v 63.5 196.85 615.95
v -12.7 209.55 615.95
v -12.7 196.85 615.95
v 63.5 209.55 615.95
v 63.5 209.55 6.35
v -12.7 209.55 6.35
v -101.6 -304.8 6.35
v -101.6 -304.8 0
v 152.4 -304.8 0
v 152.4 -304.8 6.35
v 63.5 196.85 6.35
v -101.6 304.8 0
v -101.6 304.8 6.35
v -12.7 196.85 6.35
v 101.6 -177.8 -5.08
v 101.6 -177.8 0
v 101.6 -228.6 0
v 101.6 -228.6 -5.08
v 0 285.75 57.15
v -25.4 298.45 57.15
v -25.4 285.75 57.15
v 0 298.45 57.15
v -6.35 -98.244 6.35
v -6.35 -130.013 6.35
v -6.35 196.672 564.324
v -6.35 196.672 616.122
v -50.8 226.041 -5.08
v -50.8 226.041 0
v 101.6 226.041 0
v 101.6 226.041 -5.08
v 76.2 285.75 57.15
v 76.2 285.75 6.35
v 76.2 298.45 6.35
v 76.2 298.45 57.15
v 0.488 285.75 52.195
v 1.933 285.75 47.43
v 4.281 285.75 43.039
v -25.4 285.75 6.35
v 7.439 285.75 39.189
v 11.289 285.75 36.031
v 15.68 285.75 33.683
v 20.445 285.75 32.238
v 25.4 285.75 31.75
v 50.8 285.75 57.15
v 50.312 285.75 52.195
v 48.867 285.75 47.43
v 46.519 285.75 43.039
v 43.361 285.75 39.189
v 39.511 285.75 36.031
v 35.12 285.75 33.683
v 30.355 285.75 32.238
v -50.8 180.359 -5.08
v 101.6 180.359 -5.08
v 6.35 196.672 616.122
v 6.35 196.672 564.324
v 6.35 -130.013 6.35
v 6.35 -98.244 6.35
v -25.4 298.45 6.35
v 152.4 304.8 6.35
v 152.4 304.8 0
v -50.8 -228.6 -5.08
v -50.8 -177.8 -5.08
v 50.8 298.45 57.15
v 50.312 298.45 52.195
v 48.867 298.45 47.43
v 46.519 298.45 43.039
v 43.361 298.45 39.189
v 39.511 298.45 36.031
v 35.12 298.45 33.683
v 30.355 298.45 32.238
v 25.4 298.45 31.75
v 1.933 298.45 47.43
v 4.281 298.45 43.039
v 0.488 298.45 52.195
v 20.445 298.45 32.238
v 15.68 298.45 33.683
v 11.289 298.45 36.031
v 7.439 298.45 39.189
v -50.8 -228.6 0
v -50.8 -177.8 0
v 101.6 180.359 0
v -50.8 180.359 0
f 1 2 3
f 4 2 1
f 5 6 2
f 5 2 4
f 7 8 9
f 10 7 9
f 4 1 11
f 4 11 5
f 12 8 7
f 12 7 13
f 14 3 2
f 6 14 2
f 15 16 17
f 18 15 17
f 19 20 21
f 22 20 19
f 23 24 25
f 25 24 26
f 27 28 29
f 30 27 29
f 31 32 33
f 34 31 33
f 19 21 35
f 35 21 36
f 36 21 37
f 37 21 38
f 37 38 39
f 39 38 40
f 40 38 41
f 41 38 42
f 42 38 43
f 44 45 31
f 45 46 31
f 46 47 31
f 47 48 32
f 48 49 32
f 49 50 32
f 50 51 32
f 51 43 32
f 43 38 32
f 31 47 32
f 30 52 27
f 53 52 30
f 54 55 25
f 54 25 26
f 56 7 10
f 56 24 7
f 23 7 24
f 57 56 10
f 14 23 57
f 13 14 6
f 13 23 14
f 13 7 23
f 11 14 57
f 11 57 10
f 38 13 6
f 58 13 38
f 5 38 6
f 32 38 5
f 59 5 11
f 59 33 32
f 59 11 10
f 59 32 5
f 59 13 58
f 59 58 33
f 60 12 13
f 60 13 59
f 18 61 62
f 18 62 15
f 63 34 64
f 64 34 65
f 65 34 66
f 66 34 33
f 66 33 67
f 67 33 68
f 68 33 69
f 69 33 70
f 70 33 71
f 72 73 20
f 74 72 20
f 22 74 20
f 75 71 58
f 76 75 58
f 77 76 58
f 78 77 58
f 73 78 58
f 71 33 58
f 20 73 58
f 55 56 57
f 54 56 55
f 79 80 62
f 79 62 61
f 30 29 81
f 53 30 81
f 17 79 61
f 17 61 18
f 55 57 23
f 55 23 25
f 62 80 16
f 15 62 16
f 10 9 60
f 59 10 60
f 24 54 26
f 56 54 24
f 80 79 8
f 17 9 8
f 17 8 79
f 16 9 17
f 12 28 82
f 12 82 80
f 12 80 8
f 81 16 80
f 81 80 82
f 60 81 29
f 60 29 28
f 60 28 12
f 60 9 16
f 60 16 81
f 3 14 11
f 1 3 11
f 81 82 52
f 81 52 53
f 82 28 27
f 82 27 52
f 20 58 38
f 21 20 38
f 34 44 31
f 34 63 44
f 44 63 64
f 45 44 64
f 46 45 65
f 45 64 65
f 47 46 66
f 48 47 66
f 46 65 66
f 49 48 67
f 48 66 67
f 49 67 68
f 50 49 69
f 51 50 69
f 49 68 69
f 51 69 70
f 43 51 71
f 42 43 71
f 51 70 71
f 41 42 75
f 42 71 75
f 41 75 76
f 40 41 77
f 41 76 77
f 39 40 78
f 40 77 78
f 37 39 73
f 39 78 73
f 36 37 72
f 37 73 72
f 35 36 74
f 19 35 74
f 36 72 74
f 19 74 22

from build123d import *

# Parameters (mm, degrees)
F0_W      = 254
F0_H      = 609.6
F1_DEPTH  = 6.35
F2_W      = 152.4
F2_H      = 50.8
F2_H_2    = 45.6810940742
F3_DEPTH  = 5.08
F5_DEPTH  = 50.8
F6_W      = 76.2
F6_H      = 12.7
F7_DEPTH  = 609.6
F9_DEPTH  = 6.35
F11_DEPTH = 25.4


with BuildPart() as f1:
    # F0 (on Top) → F1 (new body)
    with BuildSketch(Plane.XY):
        with Locations((25.4, 0)):
            Rectangle(F0_W, F0_H)
    extrude(amount=F1_DEPTH)

    # F2 (on face) → F3 (join)
    with BuildSketch(Plane(origin=(0, 0, 0), x_dir=(1, 0, 0), z_dir=(0, 0, -1))):
        with Locations((25.4, 203.2)):
            Rectangle(F2_W, F2_H)
        with Locations((25.4, -203.2)):
            Rectangle(F2_W, F2_H_2)
    extrude(amount=F3_DEPTH)

    # F4 (on face) → F5 (join)
    with BuildSketch(Plane.XY.offset(6.35)):
        Polygon((76.2, 285.75), (76.2, 298.45), (25.4, 298.45), (-25.4, 298.45), (-25.4, 285.75), align=None)
    extrude(amount=F5_DEPTH)

    # F6 (on face) → F7 (join)
    with BuildSketch(Plane.XY.offset(6.35)):
        with Locations((25.4, 203.2)):
            Rectangle(F6_W, F6_H)
    extrude(amount=F7_DEPTH)

    # F8 (on Right) → F9 (join, symmetric)
    with BuildSketch(Plane.YZ):
        Polygon((-133.4145218134, 0), (-101.6, 0), (196.6719031334, 564.3243789673), (196.6719031334, 616.1219477654), align=None)
    extrude(amount=F9_DEPTH, both=True)

    # F10 (on face) → F11 (cut)
    with BuildSketch(Plane(origin=(0, 298.45, 0), x_dir=(-1, 0, 0), z_dir=(0, 1, 0))):
        with BuildLine():
            ThreePointArc((-50.8, 57.15), (-25.4, 31.75), (0, 57.15))
            Line((0, 57.15), (-50.8, 57.15))
        make_face()
    extrude(amount=-F11_DEPTH, mode=Mode.SUBTRACT)


solid = f1.part
